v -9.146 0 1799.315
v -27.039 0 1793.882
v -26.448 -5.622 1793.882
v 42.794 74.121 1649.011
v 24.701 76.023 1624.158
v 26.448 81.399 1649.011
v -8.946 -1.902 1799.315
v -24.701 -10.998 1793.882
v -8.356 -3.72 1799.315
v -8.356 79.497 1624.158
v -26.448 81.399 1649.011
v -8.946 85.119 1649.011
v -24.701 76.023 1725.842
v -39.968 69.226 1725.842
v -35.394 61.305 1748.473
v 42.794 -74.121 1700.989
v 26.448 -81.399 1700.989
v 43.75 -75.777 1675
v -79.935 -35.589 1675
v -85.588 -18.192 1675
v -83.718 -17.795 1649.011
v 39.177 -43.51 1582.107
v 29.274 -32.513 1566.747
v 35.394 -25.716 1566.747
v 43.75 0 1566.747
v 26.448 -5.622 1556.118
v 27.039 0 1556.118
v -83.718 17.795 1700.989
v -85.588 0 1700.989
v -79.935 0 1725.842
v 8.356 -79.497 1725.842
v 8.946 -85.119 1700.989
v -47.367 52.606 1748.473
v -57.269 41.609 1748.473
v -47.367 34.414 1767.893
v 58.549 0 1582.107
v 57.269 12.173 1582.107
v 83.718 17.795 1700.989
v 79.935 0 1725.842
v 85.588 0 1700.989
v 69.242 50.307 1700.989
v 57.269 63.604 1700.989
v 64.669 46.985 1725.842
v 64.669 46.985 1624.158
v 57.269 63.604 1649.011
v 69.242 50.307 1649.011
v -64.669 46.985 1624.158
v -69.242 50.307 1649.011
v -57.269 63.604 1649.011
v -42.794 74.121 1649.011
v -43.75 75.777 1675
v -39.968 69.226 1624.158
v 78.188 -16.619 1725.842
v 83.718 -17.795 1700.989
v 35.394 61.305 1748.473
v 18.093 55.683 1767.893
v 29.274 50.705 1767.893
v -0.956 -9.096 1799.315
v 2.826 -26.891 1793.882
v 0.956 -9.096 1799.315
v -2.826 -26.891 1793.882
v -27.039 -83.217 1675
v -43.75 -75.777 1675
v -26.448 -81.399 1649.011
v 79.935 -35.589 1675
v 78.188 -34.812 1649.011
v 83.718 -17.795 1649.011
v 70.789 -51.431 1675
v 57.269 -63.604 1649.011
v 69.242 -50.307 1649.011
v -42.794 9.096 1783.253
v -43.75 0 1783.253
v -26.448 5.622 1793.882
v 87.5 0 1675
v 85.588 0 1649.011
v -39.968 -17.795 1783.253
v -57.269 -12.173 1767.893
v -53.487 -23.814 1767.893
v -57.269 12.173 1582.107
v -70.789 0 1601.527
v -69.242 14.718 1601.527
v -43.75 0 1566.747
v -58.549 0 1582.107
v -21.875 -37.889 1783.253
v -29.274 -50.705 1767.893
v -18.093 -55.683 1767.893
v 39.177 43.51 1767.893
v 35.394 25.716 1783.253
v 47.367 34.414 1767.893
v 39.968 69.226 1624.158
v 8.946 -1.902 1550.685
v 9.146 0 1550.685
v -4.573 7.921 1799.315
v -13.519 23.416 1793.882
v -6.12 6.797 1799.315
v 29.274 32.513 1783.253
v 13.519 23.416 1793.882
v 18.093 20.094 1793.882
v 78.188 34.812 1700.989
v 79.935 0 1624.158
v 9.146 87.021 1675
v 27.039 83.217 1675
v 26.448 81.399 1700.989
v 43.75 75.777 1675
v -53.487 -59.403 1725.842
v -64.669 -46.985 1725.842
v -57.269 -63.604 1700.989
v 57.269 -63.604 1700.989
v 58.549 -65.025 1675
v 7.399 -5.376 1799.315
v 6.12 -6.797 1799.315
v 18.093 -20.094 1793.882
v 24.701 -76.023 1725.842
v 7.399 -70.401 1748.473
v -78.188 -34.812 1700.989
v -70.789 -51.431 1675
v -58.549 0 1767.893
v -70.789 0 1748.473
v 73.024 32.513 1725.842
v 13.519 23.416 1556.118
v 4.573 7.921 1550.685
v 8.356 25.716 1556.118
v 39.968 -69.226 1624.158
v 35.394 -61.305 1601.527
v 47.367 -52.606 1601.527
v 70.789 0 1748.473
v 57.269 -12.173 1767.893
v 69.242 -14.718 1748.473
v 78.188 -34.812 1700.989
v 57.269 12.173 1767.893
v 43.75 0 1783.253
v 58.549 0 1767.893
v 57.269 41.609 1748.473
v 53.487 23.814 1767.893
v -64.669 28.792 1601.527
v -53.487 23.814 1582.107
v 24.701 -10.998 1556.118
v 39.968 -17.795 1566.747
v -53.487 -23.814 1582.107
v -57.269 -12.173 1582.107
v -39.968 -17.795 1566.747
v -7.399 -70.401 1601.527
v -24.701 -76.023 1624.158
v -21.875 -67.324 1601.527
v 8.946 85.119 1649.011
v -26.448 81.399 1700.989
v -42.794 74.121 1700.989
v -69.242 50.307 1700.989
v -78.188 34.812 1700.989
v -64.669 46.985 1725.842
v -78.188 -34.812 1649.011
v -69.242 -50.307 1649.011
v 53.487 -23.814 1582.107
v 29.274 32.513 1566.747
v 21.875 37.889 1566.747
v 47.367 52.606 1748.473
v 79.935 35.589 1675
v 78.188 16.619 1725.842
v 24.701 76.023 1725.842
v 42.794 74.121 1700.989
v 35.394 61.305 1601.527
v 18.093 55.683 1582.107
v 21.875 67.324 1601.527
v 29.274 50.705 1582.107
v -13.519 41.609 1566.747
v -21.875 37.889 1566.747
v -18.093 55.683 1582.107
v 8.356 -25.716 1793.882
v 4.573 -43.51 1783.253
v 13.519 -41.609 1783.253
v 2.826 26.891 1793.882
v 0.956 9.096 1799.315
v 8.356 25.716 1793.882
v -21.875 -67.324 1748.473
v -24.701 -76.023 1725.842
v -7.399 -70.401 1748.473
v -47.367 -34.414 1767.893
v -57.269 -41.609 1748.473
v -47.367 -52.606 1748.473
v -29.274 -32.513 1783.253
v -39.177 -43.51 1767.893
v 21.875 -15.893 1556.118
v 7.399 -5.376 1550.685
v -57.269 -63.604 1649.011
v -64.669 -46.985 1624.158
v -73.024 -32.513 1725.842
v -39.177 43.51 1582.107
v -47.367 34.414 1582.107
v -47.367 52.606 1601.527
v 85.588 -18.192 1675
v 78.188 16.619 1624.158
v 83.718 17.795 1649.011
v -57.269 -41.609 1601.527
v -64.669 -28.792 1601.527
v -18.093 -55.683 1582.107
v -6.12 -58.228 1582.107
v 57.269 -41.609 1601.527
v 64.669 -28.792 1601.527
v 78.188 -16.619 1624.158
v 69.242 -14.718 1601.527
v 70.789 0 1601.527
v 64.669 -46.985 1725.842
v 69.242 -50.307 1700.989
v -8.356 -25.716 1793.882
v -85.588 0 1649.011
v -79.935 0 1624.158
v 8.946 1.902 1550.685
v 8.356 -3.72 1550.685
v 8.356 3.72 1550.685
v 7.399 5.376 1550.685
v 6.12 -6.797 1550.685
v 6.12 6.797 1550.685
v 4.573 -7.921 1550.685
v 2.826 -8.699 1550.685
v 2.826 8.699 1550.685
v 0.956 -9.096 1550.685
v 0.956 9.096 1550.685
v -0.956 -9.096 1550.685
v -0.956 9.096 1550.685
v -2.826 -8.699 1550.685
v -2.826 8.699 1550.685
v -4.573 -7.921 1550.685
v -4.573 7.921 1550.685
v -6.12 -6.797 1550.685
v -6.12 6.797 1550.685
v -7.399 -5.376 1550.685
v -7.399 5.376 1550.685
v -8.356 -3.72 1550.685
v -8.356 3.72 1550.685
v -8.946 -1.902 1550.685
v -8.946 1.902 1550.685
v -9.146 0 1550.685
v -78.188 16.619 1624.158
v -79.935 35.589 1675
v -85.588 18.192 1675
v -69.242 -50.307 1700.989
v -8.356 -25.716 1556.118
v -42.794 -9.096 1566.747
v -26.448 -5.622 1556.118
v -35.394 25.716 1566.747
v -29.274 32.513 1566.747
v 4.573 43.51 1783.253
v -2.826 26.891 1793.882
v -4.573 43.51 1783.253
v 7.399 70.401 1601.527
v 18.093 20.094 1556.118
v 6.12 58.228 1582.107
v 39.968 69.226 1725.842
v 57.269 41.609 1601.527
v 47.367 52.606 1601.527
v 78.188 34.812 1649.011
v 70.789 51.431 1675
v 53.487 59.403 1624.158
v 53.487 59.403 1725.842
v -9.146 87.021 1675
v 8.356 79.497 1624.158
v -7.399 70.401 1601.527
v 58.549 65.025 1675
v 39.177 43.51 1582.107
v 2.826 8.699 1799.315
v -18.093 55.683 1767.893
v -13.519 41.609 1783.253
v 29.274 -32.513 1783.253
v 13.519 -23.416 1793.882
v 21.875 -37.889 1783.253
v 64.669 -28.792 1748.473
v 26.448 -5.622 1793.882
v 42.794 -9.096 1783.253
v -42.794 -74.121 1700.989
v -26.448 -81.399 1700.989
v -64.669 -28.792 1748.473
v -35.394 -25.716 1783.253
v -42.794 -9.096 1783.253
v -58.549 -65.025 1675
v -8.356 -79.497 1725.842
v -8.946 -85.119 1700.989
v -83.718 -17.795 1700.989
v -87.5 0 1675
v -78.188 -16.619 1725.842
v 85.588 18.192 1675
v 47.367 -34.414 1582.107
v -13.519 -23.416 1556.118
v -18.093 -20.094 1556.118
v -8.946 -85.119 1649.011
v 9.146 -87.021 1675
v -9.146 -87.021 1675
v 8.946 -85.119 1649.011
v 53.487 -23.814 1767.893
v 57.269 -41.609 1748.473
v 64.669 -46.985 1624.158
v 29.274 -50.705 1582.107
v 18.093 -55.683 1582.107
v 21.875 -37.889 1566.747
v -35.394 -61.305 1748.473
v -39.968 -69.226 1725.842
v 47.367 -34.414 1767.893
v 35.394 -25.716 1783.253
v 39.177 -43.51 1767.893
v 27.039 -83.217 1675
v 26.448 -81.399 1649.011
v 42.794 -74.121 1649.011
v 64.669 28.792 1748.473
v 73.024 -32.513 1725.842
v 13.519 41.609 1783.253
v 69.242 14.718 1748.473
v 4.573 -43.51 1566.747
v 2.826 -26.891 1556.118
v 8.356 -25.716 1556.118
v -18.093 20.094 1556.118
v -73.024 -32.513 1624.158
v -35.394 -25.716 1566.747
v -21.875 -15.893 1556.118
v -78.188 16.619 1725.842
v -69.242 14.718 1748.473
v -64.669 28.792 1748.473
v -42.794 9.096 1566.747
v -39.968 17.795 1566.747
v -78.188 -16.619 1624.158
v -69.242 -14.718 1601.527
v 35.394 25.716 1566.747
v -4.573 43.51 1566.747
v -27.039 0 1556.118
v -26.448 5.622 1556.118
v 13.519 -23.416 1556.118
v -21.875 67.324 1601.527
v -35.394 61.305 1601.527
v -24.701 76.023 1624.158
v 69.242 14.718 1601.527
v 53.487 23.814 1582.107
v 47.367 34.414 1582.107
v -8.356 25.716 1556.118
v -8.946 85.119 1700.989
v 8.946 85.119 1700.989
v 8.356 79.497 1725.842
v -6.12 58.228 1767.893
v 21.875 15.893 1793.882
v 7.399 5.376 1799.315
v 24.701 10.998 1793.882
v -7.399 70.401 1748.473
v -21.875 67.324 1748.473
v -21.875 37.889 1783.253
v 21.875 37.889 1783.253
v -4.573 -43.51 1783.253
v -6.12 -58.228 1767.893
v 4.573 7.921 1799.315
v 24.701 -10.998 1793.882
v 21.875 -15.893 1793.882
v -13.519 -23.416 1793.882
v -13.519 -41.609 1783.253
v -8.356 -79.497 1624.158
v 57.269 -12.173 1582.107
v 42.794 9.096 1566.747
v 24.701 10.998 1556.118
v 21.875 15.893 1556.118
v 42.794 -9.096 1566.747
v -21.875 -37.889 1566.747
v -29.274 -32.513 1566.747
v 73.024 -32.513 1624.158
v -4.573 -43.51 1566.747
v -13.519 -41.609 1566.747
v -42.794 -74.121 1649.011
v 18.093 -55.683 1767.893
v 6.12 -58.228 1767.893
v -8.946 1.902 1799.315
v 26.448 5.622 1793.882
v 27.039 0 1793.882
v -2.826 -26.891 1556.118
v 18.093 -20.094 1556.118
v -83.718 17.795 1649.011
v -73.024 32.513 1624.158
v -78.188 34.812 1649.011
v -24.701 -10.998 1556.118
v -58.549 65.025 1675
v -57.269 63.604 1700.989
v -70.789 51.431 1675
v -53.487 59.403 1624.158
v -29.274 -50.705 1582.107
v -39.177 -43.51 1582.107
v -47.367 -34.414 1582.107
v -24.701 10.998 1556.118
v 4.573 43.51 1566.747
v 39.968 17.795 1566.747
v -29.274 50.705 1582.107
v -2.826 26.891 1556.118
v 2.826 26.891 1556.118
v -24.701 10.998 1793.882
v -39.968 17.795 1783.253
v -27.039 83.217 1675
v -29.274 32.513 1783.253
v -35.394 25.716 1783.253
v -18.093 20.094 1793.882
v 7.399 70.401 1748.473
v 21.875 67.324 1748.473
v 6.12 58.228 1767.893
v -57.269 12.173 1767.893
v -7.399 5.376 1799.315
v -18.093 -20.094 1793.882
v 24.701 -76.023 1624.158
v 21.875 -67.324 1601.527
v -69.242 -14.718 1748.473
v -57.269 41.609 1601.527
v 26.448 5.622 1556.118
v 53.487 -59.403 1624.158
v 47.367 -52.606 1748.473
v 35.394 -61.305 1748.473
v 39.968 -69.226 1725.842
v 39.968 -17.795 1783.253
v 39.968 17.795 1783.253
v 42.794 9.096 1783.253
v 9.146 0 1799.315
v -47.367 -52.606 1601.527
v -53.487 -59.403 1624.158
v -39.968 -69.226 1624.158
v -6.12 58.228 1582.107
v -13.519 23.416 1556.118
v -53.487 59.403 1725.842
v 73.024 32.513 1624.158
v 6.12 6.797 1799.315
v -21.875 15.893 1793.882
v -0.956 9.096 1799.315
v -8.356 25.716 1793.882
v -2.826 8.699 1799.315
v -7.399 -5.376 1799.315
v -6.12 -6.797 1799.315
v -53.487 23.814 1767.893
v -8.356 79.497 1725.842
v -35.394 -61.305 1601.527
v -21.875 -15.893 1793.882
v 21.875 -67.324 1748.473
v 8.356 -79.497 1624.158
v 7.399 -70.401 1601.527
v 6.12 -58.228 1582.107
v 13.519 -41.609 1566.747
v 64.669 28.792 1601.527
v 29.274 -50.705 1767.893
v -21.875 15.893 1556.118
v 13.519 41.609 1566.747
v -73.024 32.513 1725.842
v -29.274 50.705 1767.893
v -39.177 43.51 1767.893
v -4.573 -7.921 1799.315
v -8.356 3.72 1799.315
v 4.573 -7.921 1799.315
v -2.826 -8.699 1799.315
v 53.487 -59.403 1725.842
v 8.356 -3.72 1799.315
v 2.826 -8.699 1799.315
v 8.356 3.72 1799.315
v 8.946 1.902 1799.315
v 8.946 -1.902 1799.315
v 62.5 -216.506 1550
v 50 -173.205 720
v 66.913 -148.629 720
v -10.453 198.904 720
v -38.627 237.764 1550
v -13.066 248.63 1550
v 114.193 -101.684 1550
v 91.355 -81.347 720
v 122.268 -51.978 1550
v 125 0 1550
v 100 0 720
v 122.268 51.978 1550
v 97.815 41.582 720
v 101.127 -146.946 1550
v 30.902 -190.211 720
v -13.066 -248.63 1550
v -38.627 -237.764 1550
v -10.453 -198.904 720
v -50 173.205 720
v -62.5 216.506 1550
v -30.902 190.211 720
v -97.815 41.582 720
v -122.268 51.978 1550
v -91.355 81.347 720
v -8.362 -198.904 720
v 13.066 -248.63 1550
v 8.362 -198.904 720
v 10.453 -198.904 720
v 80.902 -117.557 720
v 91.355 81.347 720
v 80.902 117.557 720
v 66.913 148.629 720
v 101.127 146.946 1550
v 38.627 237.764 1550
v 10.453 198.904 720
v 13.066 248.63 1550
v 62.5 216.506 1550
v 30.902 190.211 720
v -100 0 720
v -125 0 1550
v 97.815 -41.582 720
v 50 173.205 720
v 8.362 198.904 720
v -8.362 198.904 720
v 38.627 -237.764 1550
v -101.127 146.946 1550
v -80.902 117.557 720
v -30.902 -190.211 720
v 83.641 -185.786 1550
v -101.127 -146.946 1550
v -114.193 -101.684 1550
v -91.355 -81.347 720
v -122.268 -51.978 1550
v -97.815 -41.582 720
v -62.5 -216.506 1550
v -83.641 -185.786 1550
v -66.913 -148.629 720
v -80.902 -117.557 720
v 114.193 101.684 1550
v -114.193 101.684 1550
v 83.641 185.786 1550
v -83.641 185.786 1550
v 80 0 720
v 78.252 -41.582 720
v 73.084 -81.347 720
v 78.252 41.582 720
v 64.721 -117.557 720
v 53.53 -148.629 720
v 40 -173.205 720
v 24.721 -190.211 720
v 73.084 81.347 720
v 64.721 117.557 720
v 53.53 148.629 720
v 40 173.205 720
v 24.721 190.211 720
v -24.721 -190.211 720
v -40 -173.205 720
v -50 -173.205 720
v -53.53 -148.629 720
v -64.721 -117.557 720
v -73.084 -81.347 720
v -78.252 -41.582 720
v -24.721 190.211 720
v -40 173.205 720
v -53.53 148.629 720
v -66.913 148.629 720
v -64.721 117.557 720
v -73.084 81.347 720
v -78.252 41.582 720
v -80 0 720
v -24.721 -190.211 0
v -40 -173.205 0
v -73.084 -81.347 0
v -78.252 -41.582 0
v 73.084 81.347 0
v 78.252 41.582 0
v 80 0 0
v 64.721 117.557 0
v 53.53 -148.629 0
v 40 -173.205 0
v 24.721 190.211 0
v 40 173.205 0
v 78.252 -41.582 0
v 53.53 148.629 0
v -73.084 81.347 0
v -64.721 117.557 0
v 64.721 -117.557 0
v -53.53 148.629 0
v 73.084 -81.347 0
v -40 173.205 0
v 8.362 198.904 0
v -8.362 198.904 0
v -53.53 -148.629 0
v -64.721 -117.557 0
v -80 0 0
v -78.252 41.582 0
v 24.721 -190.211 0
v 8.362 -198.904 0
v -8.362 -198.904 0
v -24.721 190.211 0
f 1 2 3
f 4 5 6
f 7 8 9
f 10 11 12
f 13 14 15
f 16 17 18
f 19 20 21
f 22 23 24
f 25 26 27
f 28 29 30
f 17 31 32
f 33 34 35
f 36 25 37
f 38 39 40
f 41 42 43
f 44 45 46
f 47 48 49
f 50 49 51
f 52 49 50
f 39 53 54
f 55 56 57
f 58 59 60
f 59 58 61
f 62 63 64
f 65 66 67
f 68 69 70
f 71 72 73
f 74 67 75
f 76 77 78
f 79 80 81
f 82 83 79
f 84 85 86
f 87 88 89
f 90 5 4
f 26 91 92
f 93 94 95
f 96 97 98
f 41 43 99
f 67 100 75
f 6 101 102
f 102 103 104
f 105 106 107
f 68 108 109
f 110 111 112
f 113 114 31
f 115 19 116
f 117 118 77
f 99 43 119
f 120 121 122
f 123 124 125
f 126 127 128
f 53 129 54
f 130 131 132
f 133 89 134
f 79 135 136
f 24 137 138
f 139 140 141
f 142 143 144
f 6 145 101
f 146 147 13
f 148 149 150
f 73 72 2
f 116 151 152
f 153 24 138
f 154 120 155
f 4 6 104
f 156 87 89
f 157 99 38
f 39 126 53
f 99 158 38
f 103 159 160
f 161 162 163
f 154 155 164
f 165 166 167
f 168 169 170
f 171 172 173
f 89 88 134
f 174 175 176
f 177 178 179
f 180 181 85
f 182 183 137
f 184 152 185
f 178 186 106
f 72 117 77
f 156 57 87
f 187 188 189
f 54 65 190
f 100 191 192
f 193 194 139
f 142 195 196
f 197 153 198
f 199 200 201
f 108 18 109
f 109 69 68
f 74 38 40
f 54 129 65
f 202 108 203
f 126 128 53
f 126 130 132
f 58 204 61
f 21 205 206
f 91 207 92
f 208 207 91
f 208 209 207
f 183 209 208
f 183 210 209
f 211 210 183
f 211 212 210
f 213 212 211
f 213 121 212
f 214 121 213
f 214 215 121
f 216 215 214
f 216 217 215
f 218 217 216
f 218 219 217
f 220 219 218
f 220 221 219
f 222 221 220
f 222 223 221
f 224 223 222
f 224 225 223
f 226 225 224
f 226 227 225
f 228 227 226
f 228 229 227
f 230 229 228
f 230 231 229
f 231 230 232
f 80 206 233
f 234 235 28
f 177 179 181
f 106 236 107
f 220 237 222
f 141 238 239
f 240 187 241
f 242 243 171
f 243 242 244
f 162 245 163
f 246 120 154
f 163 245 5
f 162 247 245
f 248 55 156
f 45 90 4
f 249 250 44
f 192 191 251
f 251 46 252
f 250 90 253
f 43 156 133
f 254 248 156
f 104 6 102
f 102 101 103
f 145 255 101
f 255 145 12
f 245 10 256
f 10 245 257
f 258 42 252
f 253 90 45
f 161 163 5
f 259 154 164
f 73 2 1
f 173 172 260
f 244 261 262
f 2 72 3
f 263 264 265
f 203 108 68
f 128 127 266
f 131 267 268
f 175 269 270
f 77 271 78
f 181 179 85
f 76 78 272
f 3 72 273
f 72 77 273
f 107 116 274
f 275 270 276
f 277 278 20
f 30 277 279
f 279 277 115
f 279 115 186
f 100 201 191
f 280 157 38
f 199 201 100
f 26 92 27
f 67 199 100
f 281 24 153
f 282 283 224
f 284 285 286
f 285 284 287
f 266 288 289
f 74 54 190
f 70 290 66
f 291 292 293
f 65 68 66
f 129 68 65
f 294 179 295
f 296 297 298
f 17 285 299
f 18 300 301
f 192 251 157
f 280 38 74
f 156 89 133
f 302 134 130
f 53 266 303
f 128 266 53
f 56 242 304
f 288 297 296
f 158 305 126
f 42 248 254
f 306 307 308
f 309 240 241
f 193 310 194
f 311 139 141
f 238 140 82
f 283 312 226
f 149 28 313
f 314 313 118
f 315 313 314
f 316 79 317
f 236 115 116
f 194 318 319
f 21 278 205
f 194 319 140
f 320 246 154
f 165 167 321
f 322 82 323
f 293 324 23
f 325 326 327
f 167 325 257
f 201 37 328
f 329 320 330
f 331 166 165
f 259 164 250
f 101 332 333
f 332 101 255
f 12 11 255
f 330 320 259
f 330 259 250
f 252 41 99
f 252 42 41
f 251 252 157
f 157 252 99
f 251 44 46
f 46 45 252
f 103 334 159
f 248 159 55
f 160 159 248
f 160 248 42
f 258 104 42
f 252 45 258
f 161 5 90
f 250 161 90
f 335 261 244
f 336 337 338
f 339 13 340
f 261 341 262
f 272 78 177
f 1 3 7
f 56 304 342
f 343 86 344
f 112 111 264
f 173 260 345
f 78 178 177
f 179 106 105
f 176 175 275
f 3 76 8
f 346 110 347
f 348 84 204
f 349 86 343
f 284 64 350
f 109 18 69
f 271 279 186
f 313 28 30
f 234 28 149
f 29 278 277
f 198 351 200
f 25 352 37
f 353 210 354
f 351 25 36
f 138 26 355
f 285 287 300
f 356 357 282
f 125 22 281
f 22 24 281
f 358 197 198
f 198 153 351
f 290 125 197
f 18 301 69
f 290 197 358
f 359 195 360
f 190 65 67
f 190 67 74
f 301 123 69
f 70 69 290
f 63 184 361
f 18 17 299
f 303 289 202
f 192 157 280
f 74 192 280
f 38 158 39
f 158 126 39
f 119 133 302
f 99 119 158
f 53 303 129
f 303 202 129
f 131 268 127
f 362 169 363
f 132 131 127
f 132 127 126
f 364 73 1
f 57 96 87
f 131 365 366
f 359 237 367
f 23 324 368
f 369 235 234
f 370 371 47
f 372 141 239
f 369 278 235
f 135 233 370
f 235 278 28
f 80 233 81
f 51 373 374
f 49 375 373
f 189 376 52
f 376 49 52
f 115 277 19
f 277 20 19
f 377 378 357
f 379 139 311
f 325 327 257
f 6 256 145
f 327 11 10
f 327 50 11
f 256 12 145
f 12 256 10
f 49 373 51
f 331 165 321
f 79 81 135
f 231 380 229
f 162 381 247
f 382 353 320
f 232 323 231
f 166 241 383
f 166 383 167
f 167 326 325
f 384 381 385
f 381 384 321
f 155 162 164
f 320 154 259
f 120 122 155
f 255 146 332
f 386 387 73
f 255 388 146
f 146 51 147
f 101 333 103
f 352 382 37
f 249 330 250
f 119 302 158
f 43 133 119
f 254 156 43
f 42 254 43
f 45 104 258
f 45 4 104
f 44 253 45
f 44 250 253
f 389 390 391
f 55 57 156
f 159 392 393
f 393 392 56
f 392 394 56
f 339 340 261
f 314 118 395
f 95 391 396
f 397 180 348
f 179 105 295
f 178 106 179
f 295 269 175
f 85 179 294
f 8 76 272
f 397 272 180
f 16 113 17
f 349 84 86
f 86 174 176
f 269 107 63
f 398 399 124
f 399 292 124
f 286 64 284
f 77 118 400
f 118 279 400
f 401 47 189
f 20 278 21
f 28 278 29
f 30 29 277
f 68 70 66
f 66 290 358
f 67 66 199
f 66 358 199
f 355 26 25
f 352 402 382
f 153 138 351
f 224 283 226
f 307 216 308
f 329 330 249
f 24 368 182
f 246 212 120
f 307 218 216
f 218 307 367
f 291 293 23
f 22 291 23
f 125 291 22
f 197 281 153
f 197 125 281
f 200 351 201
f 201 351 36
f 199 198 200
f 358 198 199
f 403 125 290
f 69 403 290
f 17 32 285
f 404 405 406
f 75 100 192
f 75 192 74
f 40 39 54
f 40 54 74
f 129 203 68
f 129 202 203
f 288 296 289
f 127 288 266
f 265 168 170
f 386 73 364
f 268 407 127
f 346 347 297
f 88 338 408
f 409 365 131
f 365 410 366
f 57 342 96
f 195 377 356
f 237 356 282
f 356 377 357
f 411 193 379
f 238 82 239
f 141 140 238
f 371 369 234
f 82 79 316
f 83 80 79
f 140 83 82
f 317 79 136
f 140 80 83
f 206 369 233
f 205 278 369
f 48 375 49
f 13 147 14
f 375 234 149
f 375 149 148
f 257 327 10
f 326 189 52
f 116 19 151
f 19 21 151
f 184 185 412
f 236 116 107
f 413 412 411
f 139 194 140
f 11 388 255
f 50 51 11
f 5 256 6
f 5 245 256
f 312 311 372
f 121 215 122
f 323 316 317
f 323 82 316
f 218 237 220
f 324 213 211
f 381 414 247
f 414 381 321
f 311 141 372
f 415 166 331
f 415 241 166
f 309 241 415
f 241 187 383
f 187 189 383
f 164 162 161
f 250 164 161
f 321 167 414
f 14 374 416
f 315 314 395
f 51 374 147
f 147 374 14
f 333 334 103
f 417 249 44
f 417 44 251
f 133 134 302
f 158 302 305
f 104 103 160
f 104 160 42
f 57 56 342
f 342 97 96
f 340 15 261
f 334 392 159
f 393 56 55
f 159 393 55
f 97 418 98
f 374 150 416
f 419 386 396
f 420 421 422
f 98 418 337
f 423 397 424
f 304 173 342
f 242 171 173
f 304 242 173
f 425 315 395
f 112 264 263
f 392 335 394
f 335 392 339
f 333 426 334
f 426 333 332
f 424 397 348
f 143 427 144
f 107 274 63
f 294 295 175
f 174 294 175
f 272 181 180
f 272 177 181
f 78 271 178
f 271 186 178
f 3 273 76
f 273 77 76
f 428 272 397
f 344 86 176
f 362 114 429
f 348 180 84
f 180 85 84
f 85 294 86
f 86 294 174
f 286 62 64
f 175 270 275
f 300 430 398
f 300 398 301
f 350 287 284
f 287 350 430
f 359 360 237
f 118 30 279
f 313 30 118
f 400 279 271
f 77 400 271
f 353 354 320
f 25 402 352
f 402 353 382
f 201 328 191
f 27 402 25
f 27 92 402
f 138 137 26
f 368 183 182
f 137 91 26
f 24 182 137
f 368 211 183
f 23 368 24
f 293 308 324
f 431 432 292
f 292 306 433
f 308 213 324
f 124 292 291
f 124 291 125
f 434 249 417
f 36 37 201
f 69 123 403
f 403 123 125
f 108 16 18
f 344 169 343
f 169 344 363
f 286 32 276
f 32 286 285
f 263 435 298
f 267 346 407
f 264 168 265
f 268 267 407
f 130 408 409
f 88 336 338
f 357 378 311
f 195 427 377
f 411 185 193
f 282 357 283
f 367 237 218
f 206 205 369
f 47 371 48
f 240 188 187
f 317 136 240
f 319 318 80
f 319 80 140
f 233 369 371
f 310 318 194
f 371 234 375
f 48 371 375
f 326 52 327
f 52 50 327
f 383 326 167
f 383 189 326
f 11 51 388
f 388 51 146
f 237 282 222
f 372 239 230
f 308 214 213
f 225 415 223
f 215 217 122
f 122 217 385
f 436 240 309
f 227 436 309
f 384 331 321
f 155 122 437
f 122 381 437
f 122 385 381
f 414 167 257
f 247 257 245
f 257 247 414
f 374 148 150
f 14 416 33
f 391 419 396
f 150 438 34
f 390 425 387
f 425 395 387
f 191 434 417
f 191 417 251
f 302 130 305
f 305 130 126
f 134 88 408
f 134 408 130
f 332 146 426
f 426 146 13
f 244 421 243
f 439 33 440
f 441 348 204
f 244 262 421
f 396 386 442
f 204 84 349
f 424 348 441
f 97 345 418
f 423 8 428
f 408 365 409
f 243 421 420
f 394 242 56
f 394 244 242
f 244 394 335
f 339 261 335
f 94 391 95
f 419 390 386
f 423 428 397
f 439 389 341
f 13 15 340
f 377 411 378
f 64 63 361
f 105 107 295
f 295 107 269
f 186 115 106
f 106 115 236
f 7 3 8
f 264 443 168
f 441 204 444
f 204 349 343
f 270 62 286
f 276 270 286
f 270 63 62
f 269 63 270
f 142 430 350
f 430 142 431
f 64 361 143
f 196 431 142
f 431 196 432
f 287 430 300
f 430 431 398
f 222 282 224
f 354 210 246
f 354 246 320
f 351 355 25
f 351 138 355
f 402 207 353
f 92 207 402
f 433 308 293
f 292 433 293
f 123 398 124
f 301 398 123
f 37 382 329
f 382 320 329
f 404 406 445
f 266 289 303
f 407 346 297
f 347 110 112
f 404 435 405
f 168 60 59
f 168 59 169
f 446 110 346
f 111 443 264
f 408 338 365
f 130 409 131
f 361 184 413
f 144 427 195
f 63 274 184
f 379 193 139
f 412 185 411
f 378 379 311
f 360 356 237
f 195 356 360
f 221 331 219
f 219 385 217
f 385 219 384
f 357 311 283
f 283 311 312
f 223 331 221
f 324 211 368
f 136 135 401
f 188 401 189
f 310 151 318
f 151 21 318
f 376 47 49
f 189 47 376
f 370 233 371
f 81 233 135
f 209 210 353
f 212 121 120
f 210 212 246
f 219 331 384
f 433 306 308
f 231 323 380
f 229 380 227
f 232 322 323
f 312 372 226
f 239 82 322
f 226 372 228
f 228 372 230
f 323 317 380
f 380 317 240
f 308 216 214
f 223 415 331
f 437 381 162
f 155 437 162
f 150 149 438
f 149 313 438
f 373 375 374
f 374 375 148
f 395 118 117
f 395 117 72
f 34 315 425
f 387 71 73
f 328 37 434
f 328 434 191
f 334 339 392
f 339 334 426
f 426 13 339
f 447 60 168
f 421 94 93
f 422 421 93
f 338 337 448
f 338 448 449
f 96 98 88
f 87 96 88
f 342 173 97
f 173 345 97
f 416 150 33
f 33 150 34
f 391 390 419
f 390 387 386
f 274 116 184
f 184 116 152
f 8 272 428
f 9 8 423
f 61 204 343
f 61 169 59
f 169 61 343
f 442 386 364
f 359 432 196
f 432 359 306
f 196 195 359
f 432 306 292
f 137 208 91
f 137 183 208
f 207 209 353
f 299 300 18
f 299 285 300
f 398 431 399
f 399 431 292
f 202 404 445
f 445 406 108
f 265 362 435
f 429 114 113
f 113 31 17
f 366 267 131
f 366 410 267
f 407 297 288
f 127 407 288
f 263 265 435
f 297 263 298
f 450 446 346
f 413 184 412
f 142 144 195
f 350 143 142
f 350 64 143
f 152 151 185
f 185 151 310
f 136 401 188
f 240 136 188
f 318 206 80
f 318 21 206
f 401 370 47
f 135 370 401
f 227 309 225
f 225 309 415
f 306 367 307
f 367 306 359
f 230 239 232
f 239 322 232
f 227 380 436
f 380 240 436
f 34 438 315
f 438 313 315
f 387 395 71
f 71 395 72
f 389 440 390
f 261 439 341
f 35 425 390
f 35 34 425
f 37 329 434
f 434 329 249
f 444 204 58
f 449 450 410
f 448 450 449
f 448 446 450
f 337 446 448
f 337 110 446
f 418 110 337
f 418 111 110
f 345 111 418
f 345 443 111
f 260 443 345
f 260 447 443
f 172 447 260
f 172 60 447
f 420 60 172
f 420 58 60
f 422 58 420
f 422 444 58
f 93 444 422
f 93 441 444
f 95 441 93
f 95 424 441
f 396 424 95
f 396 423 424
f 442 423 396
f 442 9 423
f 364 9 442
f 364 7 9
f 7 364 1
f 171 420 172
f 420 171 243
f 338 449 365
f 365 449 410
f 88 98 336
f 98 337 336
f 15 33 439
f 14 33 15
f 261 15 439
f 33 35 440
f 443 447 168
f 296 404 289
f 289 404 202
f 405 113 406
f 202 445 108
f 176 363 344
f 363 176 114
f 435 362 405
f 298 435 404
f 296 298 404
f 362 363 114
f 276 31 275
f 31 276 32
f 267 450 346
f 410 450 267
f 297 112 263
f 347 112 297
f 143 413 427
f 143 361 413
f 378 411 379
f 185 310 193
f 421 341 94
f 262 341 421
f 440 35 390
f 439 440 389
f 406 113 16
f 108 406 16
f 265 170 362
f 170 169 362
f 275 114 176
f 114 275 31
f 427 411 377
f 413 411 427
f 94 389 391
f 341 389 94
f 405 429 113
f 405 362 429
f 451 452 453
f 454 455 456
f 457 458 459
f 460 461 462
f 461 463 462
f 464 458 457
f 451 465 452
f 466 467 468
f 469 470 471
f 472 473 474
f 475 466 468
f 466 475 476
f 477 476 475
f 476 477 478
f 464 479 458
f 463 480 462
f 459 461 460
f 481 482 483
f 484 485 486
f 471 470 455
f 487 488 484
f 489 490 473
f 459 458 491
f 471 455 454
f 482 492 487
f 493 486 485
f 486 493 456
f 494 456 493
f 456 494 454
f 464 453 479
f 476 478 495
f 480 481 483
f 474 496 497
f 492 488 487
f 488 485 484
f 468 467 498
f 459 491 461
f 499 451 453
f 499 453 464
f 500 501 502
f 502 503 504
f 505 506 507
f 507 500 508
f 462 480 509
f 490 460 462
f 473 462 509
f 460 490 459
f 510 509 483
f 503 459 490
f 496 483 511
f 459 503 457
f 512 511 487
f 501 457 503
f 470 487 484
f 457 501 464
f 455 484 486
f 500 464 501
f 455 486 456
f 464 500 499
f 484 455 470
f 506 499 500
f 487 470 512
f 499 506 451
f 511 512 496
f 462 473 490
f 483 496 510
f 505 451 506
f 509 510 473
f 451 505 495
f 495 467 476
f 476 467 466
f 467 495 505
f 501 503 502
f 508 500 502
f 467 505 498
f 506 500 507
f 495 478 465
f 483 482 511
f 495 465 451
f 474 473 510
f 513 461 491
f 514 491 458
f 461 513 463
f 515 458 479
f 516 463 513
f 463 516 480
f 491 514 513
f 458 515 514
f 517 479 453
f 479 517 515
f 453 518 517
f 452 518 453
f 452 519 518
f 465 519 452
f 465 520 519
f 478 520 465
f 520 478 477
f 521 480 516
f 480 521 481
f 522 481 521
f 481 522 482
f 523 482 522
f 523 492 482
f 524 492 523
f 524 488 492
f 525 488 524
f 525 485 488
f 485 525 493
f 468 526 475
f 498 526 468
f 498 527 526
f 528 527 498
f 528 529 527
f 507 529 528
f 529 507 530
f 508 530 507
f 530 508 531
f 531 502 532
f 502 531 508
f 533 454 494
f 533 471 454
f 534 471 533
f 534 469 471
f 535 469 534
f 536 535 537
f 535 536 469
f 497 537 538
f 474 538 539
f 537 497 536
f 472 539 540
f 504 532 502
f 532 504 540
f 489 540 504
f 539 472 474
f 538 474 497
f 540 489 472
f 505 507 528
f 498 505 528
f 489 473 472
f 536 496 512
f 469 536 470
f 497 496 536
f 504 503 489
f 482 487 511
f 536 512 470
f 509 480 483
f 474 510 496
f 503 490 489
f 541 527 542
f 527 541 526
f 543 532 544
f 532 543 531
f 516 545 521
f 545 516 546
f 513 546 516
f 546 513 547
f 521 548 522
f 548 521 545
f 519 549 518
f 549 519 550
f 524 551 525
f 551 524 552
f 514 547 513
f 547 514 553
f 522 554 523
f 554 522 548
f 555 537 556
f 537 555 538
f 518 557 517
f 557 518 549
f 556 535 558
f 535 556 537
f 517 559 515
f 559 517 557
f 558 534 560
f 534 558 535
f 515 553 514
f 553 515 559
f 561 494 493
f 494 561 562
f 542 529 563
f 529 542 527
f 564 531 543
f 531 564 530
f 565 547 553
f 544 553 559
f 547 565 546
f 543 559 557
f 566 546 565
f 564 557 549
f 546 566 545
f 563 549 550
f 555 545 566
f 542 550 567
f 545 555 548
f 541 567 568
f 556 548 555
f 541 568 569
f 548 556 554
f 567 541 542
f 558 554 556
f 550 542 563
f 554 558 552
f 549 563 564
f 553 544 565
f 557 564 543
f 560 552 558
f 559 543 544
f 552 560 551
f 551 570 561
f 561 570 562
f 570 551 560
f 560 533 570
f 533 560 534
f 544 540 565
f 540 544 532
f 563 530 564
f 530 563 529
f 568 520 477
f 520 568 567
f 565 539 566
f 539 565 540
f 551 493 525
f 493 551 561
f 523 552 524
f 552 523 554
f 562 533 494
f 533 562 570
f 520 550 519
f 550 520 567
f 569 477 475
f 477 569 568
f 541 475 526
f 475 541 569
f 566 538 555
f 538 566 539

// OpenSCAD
/* Simple human silhouette for OpenScad */

humanShape(height_m=1.8);

module humanShape(height_m) {
    height_mm = height_m*1000;
    headDiam = 250;
    shoulder = 500;
    shoulderH = height_mm - headDiam;
    hips = 400;
    hipsH = 0.4*height_mm;
    feet = 400;
    union() {
    // head 
    translate([0,0,height_mm-0.5*headDiam]) scale([0.7,0.7,1]) sphere(d=headDiam);
    // Shoulder -> hips
    translate([0,0,hipsH])  scale([0.5,1,1]) cylinder(d1=hips,d2=shoulder,h=shoulderH-hipsH);
    // Hips -> feet
    scale([0.4,1,1]) cylinder(d1=feet,d2=hips,h=shoulderH-hipsH);    /*translate([0,0,chest_height+17]) cylinder(chest_height,chest/2-3,        waist/2);
    translate([0,0,chest_height*2+17]) cylinder(chest_height, waist/2, hips/2);
    translate([0,0,chest_height*3+17]) cylinder(torso_height*1.4, hips/2, 8);
    translate([0,0,torso_height*2.4+17]) cylinder(2,10,10);*/
    };
}
